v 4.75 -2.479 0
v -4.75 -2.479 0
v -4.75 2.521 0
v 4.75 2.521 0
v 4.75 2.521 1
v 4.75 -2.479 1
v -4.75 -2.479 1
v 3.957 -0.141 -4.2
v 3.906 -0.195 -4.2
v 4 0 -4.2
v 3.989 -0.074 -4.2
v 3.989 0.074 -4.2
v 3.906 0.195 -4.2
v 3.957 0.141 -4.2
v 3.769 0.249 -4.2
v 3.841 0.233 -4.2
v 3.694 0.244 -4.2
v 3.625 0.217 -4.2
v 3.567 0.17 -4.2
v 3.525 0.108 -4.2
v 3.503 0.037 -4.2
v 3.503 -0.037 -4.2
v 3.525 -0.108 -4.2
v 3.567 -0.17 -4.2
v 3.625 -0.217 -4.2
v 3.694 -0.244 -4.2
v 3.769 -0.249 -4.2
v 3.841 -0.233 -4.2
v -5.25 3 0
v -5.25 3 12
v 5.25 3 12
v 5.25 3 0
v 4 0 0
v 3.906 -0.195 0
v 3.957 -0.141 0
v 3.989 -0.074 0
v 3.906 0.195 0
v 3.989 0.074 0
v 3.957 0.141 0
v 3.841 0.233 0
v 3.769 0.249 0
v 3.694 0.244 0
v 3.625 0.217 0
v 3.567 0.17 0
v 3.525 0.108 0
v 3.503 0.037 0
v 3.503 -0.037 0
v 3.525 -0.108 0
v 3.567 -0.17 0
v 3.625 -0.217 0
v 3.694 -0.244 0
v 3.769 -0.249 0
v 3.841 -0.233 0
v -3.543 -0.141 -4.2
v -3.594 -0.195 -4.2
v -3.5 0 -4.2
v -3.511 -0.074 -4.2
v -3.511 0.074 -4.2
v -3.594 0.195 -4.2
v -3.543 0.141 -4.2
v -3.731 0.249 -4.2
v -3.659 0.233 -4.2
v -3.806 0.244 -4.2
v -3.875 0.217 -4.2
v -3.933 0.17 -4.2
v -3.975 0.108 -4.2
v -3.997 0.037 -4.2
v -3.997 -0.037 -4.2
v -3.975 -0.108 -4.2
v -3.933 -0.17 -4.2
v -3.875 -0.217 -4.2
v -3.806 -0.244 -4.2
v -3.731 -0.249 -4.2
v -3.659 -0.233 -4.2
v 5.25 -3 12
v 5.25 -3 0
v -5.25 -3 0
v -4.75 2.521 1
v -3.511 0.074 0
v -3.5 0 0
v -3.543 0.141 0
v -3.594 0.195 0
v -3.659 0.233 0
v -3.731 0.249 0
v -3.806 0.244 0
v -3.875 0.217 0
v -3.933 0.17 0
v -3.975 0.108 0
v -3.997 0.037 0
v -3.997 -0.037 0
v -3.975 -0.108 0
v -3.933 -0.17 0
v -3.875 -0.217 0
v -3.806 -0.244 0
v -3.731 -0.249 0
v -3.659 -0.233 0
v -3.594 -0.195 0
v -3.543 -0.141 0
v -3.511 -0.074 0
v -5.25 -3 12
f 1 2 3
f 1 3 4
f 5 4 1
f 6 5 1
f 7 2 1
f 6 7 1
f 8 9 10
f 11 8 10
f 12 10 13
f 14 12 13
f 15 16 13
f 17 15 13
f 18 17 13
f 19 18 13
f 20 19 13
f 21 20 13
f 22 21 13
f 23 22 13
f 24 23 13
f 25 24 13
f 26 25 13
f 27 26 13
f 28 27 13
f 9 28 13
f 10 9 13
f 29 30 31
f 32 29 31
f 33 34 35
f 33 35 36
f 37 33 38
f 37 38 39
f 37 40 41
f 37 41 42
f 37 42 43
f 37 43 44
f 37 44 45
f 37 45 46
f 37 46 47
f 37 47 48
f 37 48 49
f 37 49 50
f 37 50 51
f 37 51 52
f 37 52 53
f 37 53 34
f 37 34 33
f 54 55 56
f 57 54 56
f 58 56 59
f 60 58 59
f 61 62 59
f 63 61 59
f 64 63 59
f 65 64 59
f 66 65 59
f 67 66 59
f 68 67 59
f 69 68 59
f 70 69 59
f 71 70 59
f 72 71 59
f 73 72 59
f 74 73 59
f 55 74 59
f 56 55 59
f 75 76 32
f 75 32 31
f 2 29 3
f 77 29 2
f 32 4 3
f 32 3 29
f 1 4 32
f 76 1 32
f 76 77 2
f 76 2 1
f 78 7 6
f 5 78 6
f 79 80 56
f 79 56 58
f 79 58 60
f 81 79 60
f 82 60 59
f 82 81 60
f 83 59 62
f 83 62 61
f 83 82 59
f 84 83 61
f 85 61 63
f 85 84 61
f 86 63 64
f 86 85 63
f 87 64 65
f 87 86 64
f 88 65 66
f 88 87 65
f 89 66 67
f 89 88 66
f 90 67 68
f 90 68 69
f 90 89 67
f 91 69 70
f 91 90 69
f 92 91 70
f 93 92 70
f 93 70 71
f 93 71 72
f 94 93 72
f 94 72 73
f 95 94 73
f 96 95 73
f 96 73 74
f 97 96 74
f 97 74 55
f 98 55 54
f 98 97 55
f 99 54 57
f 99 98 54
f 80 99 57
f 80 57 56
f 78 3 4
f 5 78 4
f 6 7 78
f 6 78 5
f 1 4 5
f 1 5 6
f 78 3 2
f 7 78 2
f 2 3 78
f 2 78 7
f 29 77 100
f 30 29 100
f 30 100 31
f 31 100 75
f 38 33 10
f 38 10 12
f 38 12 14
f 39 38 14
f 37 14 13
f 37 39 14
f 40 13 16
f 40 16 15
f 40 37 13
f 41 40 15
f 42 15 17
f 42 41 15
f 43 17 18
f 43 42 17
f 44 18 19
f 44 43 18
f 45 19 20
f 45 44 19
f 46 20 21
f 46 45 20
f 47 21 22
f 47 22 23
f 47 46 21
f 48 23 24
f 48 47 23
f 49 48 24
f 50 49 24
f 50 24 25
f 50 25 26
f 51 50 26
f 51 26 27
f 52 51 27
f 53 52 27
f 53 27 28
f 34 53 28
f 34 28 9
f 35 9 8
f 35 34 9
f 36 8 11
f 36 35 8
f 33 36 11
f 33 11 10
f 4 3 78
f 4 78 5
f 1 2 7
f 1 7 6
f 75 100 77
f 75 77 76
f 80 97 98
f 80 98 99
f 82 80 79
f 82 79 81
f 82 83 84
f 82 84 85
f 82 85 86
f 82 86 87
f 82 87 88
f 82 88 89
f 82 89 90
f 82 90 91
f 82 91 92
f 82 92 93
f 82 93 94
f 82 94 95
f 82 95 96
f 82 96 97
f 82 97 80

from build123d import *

# Parameters (mm, degrees)
F0_W          = 10.5
F0_H          = 12
F1_DEPTH      = 3
F1_DEPTH_BACK = 3
F2_R          = 0.25
F3_DEPTH      = 4.2
F4_W          = 9.5
F4_H          = 5
F5_DEPTH      = 1


with BuildPart() as f1:
    # F0 (on Front) → F1 (new body, two sides)
    with BuildSketch(Plane.XZ) as f1_sk:
        with Locations((0, 6)):
            Rectangle(F0_W, F0_H)
    extrude(amount=F1_DEPTH)
    extrude(f1_sk.sketch, amount=-F1_DEPTH_BACK)


with BuildPart() as f3:
    # F2 (on Top) → F3 (new body)
    with BuildSketch(Plane.XY):
        with Locations((-3.75, 0)):
            Circle(F2_R)
        with Locations((3.75, 0)):
            Circle(F2_R)
    extrude(amount=-F3_DEPTH)


with BuildPart() as f5:
    # F4 (on face) → F5 (new body)
    with BuildSketch(Plane(origin=(0, 0, 0), x_dir=(1, 0, 0), z_dir=(0, 0, -1))):
        with Locations((0, -0.020833)):
            Rectangle(F4_W, F4_H)
    extrude(amount=-F5_DEPTH)


with BuildPart() as f1_1:
    add(f1.part)

    # F6: cut F5
    add(f5.part, mode=Mode.SUBTRACT)


solid = Compound([f3.part, f5.part, f1_1.part])
